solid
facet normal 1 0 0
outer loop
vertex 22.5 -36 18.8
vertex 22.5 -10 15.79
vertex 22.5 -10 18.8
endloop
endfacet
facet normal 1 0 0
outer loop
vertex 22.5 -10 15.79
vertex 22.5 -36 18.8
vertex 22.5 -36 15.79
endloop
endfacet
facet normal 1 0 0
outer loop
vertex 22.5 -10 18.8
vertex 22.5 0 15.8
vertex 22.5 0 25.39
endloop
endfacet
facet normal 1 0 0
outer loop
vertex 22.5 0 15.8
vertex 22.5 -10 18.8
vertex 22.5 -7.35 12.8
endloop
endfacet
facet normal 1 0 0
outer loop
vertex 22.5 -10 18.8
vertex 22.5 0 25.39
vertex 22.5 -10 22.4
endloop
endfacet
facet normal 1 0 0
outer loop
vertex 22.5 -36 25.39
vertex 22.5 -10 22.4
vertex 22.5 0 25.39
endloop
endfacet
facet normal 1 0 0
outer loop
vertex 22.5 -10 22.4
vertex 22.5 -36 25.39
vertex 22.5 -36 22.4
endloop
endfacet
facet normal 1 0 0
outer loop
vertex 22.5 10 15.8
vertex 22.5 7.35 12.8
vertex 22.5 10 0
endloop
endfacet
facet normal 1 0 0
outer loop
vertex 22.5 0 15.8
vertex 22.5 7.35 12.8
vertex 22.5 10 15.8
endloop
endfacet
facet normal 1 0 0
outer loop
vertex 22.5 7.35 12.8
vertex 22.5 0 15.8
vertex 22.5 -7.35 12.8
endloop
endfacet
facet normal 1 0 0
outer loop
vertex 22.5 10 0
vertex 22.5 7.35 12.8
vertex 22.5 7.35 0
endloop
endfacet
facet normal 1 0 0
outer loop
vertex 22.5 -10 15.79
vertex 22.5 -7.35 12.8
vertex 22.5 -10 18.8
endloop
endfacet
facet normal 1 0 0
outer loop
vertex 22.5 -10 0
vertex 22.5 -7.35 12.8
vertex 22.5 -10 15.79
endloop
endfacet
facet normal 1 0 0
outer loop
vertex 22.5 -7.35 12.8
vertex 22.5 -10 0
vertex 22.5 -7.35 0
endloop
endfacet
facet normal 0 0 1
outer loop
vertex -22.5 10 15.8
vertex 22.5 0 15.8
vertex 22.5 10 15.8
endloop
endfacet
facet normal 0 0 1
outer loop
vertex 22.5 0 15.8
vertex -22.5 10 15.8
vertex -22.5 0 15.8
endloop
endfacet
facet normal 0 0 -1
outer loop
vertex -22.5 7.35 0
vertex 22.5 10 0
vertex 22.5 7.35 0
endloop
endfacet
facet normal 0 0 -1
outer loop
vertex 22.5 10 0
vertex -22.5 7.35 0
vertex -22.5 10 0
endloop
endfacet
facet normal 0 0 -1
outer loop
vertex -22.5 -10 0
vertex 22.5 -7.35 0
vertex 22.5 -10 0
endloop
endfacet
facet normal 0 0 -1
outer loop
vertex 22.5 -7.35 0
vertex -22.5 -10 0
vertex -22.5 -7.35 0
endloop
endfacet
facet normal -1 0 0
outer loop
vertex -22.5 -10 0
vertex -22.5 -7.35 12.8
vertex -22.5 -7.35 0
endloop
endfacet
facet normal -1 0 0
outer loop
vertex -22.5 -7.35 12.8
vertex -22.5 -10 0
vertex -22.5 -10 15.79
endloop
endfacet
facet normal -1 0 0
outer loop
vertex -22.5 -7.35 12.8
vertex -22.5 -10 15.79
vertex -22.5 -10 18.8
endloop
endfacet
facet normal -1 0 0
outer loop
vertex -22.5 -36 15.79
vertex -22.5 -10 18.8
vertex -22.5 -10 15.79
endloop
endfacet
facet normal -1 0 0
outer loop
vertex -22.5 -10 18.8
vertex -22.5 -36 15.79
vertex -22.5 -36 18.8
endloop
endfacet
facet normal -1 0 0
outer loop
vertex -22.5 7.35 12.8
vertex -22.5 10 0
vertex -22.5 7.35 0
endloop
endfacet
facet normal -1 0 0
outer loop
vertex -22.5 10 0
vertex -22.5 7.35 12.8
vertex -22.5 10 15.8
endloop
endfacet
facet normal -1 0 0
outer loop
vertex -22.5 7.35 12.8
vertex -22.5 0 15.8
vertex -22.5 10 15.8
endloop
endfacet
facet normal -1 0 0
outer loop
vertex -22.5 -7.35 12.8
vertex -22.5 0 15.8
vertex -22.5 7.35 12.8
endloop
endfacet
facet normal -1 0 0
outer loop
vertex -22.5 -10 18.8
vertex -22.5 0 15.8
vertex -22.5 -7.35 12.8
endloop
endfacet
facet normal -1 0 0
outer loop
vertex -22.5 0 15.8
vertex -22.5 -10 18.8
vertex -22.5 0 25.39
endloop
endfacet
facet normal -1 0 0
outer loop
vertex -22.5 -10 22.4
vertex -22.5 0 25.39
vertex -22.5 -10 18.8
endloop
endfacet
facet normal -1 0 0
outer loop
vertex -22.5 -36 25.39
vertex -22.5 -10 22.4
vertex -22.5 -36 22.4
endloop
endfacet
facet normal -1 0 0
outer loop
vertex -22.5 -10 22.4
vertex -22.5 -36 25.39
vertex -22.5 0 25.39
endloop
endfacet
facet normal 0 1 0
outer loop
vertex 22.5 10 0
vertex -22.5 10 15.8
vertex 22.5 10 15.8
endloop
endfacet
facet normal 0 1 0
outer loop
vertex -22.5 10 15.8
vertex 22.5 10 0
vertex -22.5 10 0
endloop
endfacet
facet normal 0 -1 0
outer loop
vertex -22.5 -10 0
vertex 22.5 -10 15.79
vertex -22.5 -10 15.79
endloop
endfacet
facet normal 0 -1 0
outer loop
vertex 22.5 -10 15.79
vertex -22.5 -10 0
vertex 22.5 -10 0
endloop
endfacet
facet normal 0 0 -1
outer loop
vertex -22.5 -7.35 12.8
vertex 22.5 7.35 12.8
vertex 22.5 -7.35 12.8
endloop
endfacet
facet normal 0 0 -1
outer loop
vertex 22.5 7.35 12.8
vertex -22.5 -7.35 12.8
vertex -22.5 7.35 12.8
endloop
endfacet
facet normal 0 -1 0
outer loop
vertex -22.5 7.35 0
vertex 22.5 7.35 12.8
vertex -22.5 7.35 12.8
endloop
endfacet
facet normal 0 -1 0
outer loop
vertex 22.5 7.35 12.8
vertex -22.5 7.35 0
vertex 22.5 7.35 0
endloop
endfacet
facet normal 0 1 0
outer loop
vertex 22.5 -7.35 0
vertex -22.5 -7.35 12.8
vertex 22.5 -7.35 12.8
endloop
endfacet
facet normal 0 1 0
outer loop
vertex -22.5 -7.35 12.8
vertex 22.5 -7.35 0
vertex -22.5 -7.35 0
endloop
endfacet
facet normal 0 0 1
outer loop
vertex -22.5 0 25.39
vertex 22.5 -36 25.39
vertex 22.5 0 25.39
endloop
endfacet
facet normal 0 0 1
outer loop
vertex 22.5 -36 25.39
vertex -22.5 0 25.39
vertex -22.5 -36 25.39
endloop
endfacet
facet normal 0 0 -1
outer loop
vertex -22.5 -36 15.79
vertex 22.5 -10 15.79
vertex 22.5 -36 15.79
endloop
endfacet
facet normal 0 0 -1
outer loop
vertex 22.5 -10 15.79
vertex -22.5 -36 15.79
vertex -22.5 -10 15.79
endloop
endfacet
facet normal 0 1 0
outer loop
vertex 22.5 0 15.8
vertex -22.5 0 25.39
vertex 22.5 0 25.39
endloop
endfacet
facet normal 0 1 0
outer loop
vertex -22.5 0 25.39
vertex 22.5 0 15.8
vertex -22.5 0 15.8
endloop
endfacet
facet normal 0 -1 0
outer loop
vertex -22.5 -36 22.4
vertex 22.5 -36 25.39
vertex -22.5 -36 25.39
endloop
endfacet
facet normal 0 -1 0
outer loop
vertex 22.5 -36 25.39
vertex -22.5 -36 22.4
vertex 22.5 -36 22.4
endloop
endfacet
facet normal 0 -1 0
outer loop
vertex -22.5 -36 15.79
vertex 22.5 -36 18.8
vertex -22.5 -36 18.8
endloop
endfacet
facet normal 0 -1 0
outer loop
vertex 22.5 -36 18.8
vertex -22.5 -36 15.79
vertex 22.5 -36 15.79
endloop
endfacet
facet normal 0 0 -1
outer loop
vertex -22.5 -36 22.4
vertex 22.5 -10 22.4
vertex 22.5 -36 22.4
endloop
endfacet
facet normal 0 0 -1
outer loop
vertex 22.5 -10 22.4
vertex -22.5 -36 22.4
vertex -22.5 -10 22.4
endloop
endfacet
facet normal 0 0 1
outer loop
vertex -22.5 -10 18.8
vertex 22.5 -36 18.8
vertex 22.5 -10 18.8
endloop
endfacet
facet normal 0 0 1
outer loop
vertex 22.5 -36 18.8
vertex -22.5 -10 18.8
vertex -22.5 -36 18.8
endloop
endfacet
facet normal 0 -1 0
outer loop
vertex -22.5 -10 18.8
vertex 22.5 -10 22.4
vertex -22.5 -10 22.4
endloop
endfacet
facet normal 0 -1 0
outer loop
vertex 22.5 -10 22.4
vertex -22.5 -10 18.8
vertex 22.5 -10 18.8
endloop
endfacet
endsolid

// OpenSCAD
// file: common.scad
// common.scad — shared parameters for the aquarium grow-box parts.
// Everything downstream is driven from here. Measure YOUR tank, fan and lid
// with calipers and edit this file; do not trust the defaults.

$fn = 96;

/* ---------------- measured inputs ---------------- */
glass_t  = 6;      // tank wall glass thickness. 20-long / 29 gal is usually 5-6 mm.
rim_w    = 14;     // width of the plastic top trim, front to back
rim_h    = 16;     // height of the plastic top trim
lid_t    = 3;      // lid sheet thickness. 3 mm polycarbonate is the default.
duct_nom = 101.6;  // 4 in duct. Use 152.4 for a 6 in fan.
probe_d  = 10;     // sensor-probe body diameter
cable_d  = 6;      // fattest cable that must pass through the lid

/* ---------------- print fit ---------------- */
slop = 0.35;  // clearance per side on sliding fits
wall = 3;     // default wall thickness
eps  = 0.01;  // z-fighting guard

/* ---------------- helpers ---------------- */

// A ring of clearance holes, drilled from z=0 upward.
module bolt_ring(count, radius, hole_d, depth) {
    for (i = [0 : count - 1])
        rotate([0, 0, i * 360 / count])
            translate([radius, 0, -eps])
                cylinder(d = hole_d, h = depth + 2 * eps);
}

// Rounded rectangular plate centred on the origin, sitting on z=0.
module rounded_plate(x, y, z, r = 4) {
    hull()
        for (dx = [-1, 1], dy = [-1, 1])
            translate([dx * (x / 2 - r), dy * (y / 2 - r), 0])
                cylinder(r = r, h = z);
}

// Four corner clearance holes inset from the edges of an x by y plate.
module corner_holes(x, y, inset, hole_d, depth) {
    for (dx = [-1, 1], dy = [-1, 1])
        translate([dx * (x / 2 - inset), dy * (y / 2 - inset), -eps])
            cylinder(d = hole_d, h = depth + 2 * eps);
}

// Upside-down U that straddles the tank's top trim. Opening faces -z, length
// runs along x. -y is the tank interior, +y is the outside.
// `outer_foot` extends the outer wall down the outside glass: that is what
// stops a hanging load from levering the part off the rim. Put a strip of EVA
// foam between the foot and the glass.
// Each part that uses this picks its own print orientation; see the table in
// README.md rather than assuming one here.
module rim_saddle(len = 40, jaw = rim_w, depth = rim_h * 0.8, t = wall,
                  outer_foot = 0) {
    union() {
        difference() {
            translate([-len / 2, -(jaw / 2 + t), 0])
                cube([len, jaw + 2 * t, depth + t]);
            translate([-len / 2 - eps, -(jaw / 2 + slop), -eps])
                cube([len + 2 * eps, jaw + 2 * slop, depth + eps]);
        }
        if (outer_foot > 0)
            translate([-len / 2, jaw / 2 + slop, -outer_foot])
                cube([len, t - slop, outer_foot + eps]);
    }
}

// Height of the top face of a default rim_saddle.
saddle_top = rim_h * 0.8 + wall;

// Right-triangle brace: base `len` along +x, `height` along +z, `thick` in -y.
module gusset(len, height, thick) {
    rotate([90, 0, 0])
        linear_extrude(height = thick)
            polygon([[0, 0], [len, 0], [0, height]]);
}
// main file
// lid_rail_clip.scad — captures the edge of the lid sheet and hooks over the
// tank's top trim, so the lid is held without adhesive, screws or drilled
// glass. Four to six per tank. Set `lift` above zero if you would rather run a
// deliberate perimeter gap than a louvred intake plate.
// Print on its side, length flat on the bed: both slots become vertical voids.

include <common.scad>

clip_len = 45;
reach    = 26;             // how far the channel reaches over the lid
shelf_t  = 3;              // material under and over the sheet
lift     = 0;              // perimeter air gap above the rim
gap      = lid_t + 0.6;    // sheet slot height

saddle_top = rim_h * 0.8 + wall;
chan_z     = saddle_top + lift;
span_y     = reach + rim_w / 2 + wall;

module lid_rail_clip() {
    union() {
        rim_saddle(len = clip_len);
        if (lift > 0)
            translate([-clip_len / 2, -(rim_w / 2 + wall), saddle_top - eps])
                cube([clip_len, rim_w + 2 * wall, lift + eps]);
        difference() {
            translate([-clip_len / 2, -(rim_w / 2 + wall) - reach, chan_z - eps])
                cube([clip_len, span_y, 2 * shelf_t + gap]);
            // the slot the sheet slides into
            translate([-clip_len / 2 - eps,
                       -(rim_w / 2 + wall) - reach - eps,
                       chan_z + shelf_t])
                cube([clip_len + 2 * eps, reach + eps, gap]);
        }
    }
}

lid_rail_clip();
